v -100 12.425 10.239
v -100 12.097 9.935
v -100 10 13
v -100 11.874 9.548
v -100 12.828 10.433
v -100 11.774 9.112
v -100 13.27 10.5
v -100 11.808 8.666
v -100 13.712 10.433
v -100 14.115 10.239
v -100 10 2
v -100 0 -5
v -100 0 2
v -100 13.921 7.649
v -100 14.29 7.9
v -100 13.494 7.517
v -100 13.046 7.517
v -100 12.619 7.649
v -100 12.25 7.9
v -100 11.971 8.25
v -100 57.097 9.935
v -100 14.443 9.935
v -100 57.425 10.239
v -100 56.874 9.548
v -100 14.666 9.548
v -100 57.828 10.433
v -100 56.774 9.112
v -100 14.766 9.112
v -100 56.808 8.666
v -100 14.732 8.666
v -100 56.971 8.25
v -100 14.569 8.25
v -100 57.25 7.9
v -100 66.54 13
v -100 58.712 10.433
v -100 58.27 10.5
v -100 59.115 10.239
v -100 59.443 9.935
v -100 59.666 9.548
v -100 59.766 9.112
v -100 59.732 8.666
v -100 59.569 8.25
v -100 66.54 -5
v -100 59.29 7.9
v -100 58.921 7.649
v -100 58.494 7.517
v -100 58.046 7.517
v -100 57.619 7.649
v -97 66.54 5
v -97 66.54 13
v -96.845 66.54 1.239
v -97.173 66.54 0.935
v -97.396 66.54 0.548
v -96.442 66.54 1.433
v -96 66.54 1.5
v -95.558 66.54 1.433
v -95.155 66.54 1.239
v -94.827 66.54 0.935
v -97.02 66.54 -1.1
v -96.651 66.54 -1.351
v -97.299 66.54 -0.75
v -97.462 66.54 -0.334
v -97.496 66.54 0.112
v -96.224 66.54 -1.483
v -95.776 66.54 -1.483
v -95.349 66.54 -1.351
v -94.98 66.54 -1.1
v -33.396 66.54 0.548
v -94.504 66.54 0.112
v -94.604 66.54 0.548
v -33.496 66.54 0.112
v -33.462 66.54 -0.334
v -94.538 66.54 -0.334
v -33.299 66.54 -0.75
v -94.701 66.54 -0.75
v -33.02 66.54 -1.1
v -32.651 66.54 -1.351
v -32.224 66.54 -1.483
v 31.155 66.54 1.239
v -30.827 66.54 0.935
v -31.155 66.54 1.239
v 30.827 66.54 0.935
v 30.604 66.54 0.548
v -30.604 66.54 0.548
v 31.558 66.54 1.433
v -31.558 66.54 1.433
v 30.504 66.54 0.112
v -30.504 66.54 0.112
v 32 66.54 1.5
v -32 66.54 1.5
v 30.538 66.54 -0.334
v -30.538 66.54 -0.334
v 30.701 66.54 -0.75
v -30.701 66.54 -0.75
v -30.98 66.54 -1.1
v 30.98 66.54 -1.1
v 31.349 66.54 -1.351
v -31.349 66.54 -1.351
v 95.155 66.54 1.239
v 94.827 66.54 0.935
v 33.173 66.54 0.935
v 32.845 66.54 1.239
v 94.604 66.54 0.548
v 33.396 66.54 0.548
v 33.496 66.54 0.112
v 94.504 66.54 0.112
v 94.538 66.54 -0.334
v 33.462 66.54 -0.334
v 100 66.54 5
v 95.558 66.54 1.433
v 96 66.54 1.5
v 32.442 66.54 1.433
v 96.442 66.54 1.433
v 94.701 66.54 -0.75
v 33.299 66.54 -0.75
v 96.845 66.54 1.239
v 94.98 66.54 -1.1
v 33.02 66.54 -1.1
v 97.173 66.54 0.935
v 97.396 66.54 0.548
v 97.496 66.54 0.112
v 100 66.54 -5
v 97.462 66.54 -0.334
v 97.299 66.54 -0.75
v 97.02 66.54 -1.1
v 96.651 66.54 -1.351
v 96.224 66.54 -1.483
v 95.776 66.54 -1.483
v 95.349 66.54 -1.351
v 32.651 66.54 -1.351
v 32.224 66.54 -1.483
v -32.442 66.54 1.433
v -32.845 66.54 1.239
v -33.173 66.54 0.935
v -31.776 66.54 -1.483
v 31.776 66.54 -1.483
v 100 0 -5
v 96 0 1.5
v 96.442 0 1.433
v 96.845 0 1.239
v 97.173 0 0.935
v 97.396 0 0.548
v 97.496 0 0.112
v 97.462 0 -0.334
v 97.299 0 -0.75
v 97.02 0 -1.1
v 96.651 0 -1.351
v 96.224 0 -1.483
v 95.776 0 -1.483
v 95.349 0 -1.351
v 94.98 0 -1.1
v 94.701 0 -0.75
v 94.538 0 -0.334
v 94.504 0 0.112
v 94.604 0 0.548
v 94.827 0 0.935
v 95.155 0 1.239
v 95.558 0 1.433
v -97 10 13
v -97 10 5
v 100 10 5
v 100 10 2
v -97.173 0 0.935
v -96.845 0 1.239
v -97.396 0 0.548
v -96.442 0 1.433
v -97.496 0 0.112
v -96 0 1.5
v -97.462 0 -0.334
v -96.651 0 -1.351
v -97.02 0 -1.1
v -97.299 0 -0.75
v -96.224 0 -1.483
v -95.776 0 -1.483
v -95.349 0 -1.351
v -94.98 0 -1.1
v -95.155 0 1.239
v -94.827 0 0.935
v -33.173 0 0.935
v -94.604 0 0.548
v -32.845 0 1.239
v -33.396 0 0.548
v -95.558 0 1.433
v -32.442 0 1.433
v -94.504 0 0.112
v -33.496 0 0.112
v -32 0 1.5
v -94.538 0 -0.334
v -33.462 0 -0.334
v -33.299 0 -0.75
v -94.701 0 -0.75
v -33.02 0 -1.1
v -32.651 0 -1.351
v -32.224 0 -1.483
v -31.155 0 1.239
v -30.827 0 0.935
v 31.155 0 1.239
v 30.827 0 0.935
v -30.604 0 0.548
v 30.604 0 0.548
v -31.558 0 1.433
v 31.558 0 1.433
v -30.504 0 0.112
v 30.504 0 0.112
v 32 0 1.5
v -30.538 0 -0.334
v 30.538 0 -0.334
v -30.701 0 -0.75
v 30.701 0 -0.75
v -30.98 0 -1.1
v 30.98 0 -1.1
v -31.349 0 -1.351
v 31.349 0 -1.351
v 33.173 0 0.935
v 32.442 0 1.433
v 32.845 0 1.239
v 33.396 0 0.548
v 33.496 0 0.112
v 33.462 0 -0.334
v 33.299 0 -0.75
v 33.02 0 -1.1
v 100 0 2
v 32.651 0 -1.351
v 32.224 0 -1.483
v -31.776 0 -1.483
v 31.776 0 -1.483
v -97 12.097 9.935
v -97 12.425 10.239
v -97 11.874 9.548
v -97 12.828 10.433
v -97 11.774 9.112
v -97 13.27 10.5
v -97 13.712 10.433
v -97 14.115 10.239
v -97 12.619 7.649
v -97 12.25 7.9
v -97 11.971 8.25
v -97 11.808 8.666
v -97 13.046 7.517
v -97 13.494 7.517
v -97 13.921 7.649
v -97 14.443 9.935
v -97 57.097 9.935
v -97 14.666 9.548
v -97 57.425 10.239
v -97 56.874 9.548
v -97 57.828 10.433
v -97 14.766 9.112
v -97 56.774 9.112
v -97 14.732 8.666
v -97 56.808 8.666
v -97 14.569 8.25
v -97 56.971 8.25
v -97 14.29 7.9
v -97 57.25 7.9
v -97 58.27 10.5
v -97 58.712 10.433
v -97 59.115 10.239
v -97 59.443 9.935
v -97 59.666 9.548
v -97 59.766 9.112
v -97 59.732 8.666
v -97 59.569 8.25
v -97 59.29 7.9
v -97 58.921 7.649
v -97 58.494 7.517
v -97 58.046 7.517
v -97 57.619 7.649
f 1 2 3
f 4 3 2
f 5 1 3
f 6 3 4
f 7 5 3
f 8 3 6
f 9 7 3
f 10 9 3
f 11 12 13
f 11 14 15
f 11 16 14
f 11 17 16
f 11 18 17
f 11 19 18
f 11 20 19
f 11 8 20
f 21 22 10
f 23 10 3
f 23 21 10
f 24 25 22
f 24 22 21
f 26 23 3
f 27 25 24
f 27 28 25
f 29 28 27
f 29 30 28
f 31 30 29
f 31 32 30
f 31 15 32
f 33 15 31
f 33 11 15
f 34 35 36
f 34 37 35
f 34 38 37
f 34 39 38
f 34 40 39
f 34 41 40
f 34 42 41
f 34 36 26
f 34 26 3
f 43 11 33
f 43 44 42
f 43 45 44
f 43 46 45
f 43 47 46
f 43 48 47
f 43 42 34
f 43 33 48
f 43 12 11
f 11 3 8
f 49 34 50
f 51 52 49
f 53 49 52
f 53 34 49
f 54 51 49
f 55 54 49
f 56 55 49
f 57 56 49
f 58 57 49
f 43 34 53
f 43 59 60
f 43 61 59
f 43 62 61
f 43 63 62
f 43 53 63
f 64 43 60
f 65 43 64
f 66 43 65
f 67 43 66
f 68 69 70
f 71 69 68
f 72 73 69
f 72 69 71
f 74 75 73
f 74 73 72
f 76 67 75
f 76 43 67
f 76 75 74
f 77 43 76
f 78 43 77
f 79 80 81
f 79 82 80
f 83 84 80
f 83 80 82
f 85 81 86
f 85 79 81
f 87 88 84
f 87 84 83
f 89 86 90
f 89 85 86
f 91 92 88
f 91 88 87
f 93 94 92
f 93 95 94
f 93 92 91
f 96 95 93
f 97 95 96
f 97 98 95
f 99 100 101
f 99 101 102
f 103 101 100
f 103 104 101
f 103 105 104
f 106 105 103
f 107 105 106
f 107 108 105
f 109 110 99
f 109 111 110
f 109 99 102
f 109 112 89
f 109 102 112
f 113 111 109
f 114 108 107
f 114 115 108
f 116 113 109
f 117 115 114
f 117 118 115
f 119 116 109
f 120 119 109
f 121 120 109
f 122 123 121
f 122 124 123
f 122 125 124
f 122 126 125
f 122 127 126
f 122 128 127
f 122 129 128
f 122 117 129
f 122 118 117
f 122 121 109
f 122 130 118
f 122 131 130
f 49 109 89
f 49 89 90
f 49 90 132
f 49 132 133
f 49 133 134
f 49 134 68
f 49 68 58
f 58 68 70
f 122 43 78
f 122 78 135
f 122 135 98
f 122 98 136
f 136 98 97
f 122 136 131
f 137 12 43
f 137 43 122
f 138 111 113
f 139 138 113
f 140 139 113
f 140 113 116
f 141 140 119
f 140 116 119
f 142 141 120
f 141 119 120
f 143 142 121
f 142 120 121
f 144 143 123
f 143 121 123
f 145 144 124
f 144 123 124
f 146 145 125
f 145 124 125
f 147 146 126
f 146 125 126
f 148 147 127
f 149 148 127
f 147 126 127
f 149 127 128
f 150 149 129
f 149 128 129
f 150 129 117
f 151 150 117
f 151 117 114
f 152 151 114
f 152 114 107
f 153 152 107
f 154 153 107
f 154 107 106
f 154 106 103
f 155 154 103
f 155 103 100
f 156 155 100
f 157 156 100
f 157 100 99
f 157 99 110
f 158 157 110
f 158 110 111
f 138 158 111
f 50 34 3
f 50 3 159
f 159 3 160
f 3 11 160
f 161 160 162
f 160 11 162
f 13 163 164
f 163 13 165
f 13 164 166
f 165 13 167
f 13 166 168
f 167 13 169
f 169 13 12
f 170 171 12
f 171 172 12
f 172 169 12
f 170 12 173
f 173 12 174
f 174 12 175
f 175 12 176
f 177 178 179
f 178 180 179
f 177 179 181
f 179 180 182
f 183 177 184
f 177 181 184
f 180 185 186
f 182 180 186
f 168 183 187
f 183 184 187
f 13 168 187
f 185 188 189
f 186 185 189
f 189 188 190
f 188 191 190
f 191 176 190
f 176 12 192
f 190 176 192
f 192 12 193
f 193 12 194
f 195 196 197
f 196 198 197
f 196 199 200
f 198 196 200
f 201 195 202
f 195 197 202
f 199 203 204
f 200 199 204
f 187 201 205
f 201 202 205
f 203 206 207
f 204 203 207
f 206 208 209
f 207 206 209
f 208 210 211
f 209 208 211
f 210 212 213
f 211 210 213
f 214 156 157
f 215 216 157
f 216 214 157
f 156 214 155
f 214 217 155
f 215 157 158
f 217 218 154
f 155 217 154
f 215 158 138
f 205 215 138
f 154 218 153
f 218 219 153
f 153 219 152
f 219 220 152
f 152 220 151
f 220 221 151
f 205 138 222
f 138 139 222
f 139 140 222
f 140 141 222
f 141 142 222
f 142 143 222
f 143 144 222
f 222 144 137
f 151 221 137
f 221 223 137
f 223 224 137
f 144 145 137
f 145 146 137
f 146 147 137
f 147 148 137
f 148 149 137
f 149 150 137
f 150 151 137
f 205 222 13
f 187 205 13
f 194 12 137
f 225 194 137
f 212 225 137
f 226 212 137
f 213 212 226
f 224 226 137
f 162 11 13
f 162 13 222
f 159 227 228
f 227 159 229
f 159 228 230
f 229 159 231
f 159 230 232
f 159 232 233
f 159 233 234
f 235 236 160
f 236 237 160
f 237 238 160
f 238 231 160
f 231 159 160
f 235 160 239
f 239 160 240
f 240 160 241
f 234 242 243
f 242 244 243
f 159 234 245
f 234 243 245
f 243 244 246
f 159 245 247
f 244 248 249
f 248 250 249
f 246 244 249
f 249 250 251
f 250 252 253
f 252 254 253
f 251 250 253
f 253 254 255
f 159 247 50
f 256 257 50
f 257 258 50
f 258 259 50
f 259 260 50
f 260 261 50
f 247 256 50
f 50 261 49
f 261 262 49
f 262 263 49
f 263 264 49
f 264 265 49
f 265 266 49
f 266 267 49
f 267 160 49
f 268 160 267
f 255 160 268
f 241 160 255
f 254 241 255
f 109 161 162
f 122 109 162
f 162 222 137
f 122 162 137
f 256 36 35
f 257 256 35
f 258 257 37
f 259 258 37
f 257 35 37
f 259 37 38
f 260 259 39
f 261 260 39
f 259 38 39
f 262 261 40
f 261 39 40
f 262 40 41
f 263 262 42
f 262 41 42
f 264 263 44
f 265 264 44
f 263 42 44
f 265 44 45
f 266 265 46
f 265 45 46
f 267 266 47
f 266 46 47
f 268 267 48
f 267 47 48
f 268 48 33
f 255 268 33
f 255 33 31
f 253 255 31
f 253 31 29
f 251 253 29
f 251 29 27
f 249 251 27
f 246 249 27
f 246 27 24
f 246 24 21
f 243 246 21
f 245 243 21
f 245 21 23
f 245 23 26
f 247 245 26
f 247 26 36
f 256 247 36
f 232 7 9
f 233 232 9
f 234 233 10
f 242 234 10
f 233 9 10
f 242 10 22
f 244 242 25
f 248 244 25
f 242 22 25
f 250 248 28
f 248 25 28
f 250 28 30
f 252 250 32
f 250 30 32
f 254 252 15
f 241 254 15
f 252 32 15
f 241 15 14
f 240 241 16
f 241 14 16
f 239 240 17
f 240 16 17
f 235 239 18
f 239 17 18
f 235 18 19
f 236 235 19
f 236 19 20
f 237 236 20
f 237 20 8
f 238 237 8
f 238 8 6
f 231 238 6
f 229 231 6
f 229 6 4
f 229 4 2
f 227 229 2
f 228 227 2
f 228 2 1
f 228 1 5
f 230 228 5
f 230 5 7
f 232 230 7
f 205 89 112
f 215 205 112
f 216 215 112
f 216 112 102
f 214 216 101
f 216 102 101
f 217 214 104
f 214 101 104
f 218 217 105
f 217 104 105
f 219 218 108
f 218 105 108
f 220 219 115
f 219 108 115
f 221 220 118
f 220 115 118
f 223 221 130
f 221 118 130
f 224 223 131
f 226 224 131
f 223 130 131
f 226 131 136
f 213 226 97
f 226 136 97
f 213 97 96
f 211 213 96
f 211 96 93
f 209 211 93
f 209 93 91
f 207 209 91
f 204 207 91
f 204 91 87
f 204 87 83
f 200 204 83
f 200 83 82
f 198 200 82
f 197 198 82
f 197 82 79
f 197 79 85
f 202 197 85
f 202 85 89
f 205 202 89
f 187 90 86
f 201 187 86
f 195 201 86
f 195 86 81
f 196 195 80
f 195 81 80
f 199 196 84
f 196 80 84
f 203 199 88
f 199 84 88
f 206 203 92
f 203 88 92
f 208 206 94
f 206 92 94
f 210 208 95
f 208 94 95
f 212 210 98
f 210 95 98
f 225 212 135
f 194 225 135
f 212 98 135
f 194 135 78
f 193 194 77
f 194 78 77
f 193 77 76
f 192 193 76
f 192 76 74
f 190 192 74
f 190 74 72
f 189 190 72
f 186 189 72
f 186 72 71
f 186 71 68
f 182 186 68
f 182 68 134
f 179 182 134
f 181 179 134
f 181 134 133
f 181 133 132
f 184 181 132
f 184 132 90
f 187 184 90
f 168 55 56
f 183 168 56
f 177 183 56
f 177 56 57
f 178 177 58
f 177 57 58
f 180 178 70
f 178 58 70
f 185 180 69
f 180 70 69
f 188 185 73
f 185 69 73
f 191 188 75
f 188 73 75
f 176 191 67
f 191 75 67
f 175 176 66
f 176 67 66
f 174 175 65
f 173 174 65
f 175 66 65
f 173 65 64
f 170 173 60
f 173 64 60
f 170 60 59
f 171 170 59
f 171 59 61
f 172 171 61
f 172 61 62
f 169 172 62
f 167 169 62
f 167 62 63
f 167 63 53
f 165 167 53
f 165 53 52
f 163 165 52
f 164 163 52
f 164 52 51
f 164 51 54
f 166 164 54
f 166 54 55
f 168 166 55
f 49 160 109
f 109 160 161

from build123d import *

# Parameters (mm, degrees)
SKETCH1_W           = 200
SKETCH1_H           = 10
BOSS_EXTRUDE1_DEPTH = 66.54
CUT_EXTRUDE1_REACH  = 122.219
SKETCH2_R           = 1.5
LPATTERN1_COUNT     = 4
LPATTERN1_PITCH     = 64
SKETCH3_W           = 200
SKETCH3_H           = 10
CUT_EXTRUDE2_DEPTH  = 3
SKETCH4_W           = 3
SKETCH4_H           = 56.54
BOSS_EXTRUDE2_DEPTH = 8
CUT_EXTRUDE3_REACH  = 213.179
SKETCH5_R           = 1.5


with BuildPart() as part:
    # Sketch1 → Boss-Extrude1 (new body)
    with BuildSketch(Plane(origin=(0, 0, 0), x_dir=(1, 0, 0), z_dir=(0, 1, 0))):
        Rectangle(SKETCH1_W, SKETCH1_H)
    extrude(amount=BOSS_EXTRUDE1_DEPTH)

    # Sketch2 → Cut-Extrude1 (cut, up to next)
    with BuildSketch(Plane(origin=(0, 66.54, 0), x_dir=(1, 0, 0), z_dir=(0, 1, 0)), mode=Mode.PRIVATE) as cut_extrude1_sk1:
        with Locations(Location((-96, 0, 0), (0, 0, 270))):
            Circle(SKETCH2_R)
    cut_extrude1_tool1 = extrude(cut_extrude1_sk1.sketch, amount=-CUT_EXTRUDE1_REACH, mode=Mode.PRIVATE) & part.part
    cut_extrude1 = cut_extrude1_tool1.solids().sort_by_distance((-96, 66.54, 0))[0]
    add(cut_extrude1, mode=Mode.SUBTRACT)

    # LPattern1: Cut-Extrude1 ×4
    with Locations(*[(i * LPATTERN1_PITCH, 0, 0) for i in range(1, LPATTERN1_COUNT)]):
        add(cut_extrude1, mode=Mode.SUBTRACT)

    # Sketch3 → Cut-Extrude2 (cut)
    with BuildSketch(Plane.XY.offset(5)):
        with Locations((0, 5)):
            Rectangle(SKETCH3_W, SKETCH3_H)
    extrude(amount=-CUT_EXTRUDE2_DEPTH, mode=Mode.SUBTRACT)

    # Sketch4 → Boss-Extrude2 (add)
    with BuildSketch(Plane.XY.offset(5)):
        with Locations((-98.5, 38.27)):
            Rectangle(SKETCH4_W, SKETCH4_H)
    extrude(amount=BOSS_EXTRUDE2_DEPTH)

    # Sketch5 → Cut-Extrude3 (cut, up to next)
    with BuildSketch(Plane.ZY.offset(100), mode=Mode.PRIVATE) as cut_extrude3_sk1:
        with Locations((9, 58.27)):
            Circle(SKETCH5_R)
    cut_extrude3_tool1 = extrude(cut_extrude3_sk1.sketch, amount=-CUT_EXTRUDE3_REACH, mode=Mode.PRIVATE) & part.part
    # Sketch5 → Cut-Extrude3 (cut, up to next)
    with BuildSketch(Plane.ZY.offset(100), mode=Mode.PRIVATE) as cut_extrude3_sk2:
        with Locations((9, 13.27)):
            Circle(SKETCH5_R)
    cut_extrude3_tool2 = extrude(cut_extrude3_sk2.sketch, amount=-CUT_EXTRUDE3_REACH, mode=Mode.PRIVATE) & part.part
    add(cut_extrude3_tool1.solids().sort_by_distance((-100, 58.27, 9))[0], mode=Mode.SUBTRACT)
    add(cut_extrude3_tool2.solids().sort_by_distance((-100, 13.27, 9))[0], mode=Mode.SUBTRACT)


solid = part.part
